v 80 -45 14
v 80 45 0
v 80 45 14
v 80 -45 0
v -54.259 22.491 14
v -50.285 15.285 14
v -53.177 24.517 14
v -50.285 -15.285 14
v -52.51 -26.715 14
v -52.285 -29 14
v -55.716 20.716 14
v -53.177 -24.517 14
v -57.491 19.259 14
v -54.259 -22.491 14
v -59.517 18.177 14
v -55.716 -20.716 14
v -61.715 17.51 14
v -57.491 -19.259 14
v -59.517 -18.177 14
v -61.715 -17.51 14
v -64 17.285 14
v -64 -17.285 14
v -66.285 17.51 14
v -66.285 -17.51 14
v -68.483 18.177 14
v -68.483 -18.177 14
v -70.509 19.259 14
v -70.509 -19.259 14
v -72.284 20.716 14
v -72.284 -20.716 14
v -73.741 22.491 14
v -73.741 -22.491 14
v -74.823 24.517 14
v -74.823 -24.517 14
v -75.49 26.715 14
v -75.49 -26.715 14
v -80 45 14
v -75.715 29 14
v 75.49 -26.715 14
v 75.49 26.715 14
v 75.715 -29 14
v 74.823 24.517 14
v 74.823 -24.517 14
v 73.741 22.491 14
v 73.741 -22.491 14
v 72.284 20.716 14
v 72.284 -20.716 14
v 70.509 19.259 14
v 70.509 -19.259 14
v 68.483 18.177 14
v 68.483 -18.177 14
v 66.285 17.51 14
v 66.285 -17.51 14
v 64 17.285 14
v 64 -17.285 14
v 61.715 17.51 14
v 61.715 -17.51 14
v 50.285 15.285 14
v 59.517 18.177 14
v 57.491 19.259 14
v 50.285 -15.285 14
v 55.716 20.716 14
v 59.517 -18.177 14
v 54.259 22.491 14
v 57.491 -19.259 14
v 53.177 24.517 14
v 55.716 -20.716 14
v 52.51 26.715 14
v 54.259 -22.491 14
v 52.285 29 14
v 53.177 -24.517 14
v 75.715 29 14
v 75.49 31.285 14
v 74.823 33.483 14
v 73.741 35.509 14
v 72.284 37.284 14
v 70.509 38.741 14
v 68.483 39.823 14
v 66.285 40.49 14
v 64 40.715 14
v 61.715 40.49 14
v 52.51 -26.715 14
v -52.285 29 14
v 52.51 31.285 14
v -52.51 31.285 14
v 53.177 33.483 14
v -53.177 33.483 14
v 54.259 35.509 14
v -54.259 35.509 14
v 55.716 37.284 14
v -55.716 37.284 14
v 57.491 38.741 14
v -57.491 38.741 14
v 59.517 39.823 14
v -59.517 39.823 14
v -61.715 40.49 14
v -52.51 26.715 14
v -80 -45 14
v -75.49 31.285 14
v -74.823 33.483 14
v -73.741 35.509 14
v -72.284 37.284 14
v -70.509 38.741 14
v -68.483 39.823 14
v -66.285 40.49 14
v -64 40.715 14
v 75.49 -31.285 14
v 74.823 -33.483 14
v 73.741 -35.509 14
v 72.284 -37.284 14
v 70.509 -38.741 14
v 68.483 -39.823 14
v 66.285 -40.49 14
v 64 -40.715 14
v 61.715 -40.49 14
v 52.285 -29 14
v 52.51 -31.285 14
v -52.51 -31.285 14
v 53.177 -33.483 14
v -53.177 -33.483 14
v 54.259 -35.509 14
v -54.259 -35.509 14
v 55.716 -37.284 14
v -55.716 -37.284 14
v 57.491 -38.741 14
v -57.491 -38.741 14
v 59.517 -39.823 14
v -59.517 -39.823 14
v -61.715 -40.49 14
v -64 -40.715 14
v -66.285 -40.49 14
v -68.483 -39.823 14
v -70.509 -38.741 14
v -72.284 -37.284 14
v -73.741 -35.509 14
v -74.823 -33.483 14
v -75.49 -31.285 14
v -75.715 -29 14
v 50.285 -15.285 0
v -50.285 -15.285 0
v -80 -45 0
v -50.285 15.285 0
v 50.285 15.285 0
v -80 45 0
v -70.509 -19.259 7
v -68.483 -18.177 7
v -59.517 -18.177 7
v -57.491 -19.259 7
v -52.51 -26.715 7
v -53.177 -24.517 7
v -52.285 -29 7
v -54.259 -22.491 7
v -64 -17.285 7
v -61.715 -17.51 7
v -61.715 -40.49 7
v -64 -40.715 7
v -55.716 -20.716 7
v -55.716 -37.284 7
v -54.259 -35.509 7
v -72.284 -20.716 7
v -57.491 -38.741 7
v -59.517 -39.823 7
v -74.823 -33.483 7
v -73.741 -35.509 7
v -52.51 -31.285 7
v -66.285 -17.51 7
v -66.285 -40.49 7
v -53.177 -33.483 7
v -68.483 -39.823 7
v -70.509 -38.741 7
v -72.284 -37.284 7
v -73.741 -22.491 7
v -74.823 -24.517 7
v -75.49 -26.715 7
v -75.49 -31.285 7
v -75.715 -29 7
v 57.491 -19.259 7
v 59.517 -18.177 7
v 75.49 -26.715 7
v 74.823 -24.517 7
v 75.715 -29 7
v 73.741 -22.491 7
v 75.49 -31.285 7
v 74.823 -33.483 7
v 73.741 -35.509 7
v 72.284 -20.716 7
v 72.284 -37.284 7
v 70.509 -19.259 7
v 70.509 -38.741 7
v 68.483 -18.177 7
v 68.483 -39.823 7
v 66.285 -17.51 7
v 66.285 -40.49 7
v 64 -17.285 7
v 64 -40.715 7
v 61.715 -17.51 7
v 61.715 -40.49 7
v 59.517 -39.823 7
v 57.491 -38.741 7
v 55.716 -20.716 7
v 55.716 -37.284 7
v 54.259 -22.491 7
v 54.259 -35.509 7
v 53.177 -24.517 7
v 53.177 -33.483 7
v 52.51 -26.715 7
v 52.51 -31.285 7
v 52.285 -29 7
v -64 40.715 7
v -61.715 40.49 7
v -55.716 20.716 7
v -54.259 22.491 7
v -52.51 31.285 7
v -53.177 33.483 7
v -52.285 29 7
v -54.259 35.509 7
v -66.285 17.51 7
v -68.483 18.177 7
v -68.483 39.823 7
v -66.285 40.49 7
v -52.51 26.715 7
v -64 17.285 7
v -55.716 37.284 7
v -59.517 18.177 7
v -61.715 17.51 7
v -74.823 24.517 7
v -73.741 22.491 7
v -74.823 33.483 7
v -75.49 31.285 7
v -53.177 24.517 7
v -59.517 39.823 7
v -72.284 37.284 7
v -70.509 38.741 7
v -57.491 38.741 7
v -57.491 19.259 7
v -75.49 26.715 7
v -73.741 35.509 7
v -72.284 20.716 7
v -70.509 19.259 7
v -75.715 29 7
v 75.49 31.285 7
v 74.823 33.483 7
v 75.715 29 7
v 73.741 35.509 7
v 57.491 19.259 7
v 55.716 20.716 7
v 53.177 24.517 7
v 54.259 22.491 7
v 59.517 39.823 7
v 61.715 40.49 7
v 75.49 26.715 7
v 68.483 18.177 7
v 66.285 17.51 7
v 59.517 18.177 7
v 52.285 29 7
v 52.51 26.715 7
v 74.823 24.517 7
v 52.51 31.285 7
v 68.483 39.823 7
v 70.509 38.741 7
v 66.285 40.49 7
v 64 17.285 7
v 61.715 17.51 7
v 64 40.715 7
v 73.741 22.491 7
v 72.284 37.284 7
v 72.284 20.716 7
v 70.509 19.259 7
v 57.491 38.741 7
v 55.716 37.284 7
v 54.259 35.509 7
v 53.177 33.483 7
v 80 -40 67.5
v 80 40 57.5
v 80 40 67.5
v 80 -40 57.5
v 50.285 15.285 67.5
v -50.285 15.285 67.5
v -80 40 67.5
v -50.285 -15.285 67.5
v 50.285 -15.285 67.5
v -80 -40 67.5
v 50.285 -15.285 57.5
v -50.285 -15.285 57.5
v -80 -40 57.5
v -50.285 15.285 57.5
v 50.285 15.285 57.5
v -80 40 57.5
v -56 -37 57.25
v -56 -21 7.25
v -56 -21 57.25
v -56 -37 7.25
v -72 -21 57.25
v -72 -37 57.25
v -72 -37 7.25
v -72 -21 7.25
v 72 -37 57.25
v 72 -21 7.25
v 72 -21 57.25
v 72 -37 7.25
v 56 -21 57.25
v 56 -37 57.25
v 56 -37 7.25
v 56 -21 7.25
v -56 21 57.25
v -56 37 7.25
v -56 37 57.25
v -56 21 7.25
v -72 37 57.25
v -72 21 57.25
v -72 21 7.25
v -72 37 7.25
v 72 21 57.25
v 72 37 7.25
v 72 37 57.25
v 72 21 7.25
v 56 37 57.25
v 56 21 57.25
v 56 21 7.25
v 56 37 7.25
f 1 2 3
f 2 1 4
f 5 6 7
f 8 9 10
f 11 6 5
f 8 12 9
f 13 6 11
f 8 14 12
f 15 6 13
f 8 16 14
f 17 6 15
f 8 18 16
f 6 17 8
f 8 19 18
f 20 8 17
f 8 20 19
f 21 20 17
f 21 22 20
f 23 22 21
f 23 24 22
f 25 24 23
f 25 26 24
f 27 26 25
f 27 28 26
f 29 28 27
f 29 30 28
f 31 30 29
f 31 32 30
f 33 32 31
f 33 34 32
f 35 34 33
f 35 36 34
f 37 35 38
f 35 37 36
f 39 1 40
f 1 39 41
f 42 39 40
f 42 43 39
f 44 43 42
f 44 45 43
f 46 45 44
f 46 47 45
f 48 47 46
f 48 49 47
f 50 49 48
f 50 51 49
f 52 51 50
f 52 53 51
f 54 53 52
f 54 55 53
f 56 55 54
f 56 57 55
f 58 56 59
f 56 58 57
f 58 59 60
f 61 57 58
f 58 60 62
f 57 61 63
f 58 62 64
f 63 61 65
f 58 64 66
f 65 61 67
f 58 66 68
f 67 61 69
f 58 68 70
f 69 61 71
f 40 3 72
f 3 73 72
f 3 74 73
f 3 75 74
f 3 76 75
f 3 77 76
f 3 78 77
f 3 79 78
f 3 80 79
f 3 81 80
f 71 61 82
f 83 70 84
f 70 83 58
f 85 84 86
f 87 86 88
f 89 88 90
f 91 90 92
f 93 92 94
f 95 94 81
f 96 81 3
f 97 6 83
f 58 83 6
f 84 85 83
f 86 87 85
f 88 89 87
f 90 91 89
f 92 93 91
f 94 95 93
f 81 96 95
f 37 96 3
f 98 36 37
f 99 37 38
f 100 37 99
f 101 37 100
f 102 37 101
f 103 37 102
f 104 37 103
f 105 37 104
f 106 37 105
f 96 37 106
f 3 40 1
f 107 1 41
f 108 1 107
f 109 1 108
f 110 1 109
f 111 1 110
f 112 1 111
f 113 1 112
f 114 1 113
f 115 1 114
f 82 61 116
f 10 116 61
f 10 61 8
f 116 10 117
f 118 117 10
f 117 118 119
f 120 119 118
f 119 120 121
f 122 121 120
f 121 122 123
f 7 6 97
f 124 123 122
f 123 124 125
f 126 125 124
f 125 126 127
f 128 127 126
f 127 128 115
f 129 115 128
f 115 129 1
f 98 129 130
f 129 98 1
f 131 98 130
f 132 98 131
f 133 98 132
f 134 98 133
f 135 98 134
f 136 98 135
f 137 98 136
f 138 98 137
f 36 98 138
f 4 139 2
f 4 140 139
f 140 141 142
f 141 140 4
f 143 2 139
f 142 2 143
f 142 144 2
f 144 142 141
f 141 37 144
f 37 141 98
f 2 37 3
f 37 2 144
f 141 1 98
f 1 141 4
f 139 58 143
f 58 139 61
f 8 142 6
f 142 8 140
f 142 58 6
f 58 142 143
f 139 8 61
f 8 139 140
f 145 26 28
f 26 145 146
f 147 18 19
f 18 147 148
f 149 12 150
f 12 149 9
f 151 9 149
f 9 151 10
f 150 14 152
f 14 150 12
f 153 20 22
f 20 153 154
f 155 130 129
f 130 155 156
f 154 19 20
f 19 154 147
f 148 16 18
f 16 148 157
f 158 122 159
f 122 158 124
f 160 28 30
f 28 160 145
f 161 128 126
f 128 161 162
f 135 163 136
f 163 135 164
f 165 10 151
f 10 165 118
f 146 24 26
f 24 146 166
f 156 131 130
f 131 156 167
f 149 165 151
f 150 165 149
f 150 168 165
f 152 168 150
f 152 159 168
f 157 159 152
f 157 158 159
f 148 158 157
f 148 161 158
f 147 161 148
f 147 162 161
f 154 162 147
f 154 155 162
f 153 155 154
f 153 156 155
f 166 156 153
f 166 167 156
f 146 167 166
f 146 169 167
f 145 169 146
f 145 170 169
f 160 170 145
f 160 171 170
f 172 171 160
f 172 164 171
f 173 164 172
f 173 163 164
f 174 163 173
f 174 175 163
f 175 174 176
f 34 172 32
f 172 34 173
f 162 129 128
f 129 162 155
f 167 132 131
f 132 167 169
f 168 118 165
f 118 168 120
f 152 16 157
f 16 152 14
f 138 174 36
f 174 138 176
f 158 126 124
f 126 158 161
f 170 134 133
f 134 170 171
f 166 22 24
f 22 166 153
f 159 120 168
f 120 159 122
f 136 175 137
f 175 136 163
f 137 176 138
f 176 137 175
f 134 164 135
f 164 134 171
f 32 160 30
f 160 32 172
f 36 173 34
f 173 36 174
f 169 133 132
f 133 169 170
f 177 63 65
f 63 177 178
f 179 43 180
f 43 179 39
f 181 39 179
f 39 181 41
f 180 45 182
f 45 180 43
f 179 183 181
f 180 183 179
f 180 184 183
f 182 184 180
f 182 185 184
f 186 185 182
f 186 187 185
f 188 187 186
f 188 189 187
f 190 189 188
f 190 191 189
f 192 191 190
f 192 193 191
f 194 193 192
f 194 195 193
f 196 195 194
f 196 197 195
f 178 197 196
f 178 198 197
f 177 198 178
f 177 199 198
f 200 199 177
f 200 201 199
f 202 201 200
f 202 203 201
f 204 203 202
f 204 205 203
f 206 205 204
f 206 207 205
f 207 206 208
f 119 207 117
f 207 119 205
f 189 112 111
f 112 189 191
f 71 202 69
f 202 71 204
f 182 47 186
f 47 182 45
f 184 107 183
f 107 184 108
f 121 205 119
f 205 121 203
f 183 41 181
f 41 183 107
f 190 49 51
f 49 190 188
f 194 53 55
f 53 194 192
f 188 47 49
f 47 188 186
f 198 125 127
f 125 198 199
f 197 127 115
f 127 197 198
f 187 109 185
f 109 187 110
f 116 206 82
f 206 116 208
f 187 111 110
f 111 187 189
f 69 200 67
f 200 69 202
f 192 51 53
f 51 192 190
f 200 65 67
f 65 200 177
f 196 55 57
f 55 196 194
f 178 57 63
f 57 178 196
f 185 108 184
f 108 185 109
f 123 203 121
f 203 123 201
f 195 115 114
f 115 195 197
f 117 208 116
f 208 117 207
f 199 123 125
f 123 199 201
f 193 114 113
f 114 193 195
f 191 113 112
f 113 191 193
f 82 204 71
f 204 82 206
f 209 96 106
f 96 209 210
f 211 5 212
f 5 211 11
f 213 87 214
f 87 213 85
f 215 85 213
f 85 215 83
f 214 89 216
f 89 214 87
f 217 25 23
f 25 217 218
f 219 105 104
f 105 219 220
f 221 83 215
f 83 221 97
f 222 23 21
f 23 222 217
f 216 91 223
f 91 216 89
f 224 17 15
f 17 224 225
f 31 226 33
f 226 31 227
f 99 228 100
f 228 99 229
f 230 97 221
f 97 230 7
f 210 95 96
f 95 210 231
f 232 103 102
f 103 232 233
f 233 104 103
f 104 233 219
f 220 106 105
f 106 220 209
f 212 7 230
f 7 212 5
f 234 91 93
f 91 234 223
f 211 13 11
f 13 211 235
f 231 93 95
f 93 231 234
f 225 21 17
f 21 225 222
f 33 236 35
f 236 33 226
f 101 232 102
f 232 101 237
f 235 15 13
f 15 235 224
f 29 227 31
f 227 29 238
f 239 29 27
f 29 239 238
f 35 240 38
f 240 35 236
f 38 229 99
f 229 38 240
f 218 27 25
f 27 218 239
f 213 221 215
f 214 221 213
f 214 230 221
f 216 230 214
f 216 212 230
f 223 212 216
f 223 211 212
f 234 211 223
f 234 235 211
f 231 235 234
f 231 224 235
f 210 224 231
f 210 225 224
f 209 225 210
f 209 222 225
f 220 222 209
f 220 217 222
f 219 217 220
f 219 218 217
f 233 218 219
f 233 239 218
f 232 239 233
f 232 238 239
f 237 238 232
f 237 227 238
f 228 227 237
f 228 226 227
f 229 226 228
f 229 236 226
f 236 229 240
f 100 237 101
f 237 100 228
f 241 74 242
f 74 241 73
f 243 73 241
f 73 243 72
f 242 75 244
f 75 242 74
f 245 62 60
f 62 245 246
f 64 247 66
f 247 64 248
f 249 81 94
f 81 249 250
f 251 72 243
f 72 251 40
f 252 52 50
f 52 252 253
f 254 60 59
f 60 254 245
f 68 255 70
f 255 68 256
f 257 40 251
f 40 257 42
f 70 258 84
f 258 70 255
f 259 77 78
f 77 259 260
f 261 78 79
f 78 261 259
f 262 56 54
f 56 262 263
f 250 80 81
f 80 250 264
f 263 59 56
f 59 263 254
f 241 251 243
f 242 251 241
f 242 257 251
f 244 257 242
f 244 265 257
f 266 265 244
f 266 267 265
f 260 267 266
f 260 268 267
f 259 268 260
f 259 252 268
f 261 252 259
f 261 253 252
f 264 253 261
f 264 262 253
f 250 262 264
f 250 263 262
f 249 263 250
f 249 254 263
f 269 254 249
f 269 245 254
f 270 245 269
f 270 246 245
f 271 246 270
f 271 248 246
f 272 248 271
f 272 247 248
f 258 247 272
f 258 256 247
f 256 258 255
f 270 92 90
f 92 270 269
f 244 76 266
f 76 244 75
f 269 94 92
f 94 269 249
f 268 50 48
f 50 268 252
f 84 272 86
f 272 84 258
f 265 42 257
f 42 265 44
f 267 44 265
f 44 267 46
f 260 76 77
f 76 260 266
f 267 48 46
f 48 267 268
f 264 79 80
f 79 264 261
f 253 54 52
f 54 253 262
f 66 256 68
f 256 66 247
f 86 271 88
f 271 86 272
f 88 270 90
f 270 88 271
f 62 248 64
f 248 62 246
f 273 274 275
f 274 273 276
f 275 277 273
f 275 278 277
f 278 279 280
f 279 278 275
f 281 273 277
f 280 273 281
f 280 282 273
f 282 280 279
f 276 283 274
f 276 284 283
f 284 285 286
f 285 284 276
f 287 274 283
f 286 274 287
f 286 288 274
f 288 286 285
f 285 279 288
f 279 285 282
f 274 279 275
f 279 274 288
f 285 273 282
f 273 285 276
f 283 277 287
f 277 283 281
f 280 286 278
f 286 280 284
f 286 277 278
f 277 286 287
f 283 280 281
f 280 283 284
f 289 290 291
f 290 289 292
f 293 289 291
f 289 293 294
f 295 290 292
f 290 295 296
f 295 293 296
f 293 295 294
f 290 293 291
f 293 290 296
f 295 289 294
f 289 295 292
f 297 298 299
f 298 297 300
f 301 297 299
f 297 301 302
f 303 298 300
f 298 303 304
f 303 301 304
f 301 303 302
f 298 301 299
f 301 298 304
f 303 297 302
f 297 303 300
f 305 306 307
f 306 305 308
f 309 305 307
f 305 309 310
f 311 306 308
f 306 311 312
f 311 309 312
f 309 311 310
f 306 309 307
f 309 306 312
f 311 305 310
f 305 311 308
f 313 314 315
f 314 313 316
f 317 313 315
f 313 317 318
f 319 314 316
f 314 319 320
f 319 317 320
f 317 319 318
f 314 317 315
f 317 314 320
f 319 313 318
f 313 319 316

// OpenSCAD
$fn = 32;

// ------------------------------------------------------------------------
// Frame cube: base 160 x 90 mm, posts 50 mm tall
// Every part is its own module, assembly() places every instance.
// ------------------------------------------------------------------------

// --- part 1 ---
module base_frame() {
  difference() {
    translate([-80, -45, 0]) cube([160, 90, 14]);
    translate([-50.285, -15.285, -1]) cube([100.57, 30.57, 16]);
    translate([-64, -29, 7]) cylinder(h = 8, d = 23.43);
    translate([64, -29, 7]) cylinder(h = 8, d = 23.43);
    translate([-64, 29, 7]) cylinder(h = 8, d = 23.43);
    translate([64, 29, 7]) cylinder(h = 8, d = 23.43);
  }
}

// --- part 2 ---
module corner_post() {
  translate([-8, -8, 0]) cube([16, 16, 50]);
}

// --- part 3 ---
module top_frame() {
  difference() {
    translate([-80, -40, 0]) cube([160, 80, 10]);
    translate([-50.285, -15.285, -1]) cube([100.57, 30.57, 12]);
  }
}

// --- assembly ---
module assembly() {
  color([0.80, 0.24, 0.20]) translate([0, 0, 0]) rotate([0, 0, 0]) base_frame();
  color([0.20, 0.45, 0.75]) translate([-64, -29, 7.25]) rotate([0, 0, 0]) corner_post();
  color([0.25, 0.62, 0.32]) translate([64, -29, 7.25]) rotate([0, 0, 0]) corner_post();
  color([0.92, 0.70, 0.18]) translate([-64, 29, 7.25]) rotate([0, 0, 0]) corner_post();
  color([0.58, 0.35, 0.70]) translate([64, 29, 7.25]) rotate([0, 0, 0]) corner_post();
  color([0.16, 0.66, 0.66]) translate([0, 0, 57.5]) rotate([0, 0, 0]) top_frame();
}

assembly();
